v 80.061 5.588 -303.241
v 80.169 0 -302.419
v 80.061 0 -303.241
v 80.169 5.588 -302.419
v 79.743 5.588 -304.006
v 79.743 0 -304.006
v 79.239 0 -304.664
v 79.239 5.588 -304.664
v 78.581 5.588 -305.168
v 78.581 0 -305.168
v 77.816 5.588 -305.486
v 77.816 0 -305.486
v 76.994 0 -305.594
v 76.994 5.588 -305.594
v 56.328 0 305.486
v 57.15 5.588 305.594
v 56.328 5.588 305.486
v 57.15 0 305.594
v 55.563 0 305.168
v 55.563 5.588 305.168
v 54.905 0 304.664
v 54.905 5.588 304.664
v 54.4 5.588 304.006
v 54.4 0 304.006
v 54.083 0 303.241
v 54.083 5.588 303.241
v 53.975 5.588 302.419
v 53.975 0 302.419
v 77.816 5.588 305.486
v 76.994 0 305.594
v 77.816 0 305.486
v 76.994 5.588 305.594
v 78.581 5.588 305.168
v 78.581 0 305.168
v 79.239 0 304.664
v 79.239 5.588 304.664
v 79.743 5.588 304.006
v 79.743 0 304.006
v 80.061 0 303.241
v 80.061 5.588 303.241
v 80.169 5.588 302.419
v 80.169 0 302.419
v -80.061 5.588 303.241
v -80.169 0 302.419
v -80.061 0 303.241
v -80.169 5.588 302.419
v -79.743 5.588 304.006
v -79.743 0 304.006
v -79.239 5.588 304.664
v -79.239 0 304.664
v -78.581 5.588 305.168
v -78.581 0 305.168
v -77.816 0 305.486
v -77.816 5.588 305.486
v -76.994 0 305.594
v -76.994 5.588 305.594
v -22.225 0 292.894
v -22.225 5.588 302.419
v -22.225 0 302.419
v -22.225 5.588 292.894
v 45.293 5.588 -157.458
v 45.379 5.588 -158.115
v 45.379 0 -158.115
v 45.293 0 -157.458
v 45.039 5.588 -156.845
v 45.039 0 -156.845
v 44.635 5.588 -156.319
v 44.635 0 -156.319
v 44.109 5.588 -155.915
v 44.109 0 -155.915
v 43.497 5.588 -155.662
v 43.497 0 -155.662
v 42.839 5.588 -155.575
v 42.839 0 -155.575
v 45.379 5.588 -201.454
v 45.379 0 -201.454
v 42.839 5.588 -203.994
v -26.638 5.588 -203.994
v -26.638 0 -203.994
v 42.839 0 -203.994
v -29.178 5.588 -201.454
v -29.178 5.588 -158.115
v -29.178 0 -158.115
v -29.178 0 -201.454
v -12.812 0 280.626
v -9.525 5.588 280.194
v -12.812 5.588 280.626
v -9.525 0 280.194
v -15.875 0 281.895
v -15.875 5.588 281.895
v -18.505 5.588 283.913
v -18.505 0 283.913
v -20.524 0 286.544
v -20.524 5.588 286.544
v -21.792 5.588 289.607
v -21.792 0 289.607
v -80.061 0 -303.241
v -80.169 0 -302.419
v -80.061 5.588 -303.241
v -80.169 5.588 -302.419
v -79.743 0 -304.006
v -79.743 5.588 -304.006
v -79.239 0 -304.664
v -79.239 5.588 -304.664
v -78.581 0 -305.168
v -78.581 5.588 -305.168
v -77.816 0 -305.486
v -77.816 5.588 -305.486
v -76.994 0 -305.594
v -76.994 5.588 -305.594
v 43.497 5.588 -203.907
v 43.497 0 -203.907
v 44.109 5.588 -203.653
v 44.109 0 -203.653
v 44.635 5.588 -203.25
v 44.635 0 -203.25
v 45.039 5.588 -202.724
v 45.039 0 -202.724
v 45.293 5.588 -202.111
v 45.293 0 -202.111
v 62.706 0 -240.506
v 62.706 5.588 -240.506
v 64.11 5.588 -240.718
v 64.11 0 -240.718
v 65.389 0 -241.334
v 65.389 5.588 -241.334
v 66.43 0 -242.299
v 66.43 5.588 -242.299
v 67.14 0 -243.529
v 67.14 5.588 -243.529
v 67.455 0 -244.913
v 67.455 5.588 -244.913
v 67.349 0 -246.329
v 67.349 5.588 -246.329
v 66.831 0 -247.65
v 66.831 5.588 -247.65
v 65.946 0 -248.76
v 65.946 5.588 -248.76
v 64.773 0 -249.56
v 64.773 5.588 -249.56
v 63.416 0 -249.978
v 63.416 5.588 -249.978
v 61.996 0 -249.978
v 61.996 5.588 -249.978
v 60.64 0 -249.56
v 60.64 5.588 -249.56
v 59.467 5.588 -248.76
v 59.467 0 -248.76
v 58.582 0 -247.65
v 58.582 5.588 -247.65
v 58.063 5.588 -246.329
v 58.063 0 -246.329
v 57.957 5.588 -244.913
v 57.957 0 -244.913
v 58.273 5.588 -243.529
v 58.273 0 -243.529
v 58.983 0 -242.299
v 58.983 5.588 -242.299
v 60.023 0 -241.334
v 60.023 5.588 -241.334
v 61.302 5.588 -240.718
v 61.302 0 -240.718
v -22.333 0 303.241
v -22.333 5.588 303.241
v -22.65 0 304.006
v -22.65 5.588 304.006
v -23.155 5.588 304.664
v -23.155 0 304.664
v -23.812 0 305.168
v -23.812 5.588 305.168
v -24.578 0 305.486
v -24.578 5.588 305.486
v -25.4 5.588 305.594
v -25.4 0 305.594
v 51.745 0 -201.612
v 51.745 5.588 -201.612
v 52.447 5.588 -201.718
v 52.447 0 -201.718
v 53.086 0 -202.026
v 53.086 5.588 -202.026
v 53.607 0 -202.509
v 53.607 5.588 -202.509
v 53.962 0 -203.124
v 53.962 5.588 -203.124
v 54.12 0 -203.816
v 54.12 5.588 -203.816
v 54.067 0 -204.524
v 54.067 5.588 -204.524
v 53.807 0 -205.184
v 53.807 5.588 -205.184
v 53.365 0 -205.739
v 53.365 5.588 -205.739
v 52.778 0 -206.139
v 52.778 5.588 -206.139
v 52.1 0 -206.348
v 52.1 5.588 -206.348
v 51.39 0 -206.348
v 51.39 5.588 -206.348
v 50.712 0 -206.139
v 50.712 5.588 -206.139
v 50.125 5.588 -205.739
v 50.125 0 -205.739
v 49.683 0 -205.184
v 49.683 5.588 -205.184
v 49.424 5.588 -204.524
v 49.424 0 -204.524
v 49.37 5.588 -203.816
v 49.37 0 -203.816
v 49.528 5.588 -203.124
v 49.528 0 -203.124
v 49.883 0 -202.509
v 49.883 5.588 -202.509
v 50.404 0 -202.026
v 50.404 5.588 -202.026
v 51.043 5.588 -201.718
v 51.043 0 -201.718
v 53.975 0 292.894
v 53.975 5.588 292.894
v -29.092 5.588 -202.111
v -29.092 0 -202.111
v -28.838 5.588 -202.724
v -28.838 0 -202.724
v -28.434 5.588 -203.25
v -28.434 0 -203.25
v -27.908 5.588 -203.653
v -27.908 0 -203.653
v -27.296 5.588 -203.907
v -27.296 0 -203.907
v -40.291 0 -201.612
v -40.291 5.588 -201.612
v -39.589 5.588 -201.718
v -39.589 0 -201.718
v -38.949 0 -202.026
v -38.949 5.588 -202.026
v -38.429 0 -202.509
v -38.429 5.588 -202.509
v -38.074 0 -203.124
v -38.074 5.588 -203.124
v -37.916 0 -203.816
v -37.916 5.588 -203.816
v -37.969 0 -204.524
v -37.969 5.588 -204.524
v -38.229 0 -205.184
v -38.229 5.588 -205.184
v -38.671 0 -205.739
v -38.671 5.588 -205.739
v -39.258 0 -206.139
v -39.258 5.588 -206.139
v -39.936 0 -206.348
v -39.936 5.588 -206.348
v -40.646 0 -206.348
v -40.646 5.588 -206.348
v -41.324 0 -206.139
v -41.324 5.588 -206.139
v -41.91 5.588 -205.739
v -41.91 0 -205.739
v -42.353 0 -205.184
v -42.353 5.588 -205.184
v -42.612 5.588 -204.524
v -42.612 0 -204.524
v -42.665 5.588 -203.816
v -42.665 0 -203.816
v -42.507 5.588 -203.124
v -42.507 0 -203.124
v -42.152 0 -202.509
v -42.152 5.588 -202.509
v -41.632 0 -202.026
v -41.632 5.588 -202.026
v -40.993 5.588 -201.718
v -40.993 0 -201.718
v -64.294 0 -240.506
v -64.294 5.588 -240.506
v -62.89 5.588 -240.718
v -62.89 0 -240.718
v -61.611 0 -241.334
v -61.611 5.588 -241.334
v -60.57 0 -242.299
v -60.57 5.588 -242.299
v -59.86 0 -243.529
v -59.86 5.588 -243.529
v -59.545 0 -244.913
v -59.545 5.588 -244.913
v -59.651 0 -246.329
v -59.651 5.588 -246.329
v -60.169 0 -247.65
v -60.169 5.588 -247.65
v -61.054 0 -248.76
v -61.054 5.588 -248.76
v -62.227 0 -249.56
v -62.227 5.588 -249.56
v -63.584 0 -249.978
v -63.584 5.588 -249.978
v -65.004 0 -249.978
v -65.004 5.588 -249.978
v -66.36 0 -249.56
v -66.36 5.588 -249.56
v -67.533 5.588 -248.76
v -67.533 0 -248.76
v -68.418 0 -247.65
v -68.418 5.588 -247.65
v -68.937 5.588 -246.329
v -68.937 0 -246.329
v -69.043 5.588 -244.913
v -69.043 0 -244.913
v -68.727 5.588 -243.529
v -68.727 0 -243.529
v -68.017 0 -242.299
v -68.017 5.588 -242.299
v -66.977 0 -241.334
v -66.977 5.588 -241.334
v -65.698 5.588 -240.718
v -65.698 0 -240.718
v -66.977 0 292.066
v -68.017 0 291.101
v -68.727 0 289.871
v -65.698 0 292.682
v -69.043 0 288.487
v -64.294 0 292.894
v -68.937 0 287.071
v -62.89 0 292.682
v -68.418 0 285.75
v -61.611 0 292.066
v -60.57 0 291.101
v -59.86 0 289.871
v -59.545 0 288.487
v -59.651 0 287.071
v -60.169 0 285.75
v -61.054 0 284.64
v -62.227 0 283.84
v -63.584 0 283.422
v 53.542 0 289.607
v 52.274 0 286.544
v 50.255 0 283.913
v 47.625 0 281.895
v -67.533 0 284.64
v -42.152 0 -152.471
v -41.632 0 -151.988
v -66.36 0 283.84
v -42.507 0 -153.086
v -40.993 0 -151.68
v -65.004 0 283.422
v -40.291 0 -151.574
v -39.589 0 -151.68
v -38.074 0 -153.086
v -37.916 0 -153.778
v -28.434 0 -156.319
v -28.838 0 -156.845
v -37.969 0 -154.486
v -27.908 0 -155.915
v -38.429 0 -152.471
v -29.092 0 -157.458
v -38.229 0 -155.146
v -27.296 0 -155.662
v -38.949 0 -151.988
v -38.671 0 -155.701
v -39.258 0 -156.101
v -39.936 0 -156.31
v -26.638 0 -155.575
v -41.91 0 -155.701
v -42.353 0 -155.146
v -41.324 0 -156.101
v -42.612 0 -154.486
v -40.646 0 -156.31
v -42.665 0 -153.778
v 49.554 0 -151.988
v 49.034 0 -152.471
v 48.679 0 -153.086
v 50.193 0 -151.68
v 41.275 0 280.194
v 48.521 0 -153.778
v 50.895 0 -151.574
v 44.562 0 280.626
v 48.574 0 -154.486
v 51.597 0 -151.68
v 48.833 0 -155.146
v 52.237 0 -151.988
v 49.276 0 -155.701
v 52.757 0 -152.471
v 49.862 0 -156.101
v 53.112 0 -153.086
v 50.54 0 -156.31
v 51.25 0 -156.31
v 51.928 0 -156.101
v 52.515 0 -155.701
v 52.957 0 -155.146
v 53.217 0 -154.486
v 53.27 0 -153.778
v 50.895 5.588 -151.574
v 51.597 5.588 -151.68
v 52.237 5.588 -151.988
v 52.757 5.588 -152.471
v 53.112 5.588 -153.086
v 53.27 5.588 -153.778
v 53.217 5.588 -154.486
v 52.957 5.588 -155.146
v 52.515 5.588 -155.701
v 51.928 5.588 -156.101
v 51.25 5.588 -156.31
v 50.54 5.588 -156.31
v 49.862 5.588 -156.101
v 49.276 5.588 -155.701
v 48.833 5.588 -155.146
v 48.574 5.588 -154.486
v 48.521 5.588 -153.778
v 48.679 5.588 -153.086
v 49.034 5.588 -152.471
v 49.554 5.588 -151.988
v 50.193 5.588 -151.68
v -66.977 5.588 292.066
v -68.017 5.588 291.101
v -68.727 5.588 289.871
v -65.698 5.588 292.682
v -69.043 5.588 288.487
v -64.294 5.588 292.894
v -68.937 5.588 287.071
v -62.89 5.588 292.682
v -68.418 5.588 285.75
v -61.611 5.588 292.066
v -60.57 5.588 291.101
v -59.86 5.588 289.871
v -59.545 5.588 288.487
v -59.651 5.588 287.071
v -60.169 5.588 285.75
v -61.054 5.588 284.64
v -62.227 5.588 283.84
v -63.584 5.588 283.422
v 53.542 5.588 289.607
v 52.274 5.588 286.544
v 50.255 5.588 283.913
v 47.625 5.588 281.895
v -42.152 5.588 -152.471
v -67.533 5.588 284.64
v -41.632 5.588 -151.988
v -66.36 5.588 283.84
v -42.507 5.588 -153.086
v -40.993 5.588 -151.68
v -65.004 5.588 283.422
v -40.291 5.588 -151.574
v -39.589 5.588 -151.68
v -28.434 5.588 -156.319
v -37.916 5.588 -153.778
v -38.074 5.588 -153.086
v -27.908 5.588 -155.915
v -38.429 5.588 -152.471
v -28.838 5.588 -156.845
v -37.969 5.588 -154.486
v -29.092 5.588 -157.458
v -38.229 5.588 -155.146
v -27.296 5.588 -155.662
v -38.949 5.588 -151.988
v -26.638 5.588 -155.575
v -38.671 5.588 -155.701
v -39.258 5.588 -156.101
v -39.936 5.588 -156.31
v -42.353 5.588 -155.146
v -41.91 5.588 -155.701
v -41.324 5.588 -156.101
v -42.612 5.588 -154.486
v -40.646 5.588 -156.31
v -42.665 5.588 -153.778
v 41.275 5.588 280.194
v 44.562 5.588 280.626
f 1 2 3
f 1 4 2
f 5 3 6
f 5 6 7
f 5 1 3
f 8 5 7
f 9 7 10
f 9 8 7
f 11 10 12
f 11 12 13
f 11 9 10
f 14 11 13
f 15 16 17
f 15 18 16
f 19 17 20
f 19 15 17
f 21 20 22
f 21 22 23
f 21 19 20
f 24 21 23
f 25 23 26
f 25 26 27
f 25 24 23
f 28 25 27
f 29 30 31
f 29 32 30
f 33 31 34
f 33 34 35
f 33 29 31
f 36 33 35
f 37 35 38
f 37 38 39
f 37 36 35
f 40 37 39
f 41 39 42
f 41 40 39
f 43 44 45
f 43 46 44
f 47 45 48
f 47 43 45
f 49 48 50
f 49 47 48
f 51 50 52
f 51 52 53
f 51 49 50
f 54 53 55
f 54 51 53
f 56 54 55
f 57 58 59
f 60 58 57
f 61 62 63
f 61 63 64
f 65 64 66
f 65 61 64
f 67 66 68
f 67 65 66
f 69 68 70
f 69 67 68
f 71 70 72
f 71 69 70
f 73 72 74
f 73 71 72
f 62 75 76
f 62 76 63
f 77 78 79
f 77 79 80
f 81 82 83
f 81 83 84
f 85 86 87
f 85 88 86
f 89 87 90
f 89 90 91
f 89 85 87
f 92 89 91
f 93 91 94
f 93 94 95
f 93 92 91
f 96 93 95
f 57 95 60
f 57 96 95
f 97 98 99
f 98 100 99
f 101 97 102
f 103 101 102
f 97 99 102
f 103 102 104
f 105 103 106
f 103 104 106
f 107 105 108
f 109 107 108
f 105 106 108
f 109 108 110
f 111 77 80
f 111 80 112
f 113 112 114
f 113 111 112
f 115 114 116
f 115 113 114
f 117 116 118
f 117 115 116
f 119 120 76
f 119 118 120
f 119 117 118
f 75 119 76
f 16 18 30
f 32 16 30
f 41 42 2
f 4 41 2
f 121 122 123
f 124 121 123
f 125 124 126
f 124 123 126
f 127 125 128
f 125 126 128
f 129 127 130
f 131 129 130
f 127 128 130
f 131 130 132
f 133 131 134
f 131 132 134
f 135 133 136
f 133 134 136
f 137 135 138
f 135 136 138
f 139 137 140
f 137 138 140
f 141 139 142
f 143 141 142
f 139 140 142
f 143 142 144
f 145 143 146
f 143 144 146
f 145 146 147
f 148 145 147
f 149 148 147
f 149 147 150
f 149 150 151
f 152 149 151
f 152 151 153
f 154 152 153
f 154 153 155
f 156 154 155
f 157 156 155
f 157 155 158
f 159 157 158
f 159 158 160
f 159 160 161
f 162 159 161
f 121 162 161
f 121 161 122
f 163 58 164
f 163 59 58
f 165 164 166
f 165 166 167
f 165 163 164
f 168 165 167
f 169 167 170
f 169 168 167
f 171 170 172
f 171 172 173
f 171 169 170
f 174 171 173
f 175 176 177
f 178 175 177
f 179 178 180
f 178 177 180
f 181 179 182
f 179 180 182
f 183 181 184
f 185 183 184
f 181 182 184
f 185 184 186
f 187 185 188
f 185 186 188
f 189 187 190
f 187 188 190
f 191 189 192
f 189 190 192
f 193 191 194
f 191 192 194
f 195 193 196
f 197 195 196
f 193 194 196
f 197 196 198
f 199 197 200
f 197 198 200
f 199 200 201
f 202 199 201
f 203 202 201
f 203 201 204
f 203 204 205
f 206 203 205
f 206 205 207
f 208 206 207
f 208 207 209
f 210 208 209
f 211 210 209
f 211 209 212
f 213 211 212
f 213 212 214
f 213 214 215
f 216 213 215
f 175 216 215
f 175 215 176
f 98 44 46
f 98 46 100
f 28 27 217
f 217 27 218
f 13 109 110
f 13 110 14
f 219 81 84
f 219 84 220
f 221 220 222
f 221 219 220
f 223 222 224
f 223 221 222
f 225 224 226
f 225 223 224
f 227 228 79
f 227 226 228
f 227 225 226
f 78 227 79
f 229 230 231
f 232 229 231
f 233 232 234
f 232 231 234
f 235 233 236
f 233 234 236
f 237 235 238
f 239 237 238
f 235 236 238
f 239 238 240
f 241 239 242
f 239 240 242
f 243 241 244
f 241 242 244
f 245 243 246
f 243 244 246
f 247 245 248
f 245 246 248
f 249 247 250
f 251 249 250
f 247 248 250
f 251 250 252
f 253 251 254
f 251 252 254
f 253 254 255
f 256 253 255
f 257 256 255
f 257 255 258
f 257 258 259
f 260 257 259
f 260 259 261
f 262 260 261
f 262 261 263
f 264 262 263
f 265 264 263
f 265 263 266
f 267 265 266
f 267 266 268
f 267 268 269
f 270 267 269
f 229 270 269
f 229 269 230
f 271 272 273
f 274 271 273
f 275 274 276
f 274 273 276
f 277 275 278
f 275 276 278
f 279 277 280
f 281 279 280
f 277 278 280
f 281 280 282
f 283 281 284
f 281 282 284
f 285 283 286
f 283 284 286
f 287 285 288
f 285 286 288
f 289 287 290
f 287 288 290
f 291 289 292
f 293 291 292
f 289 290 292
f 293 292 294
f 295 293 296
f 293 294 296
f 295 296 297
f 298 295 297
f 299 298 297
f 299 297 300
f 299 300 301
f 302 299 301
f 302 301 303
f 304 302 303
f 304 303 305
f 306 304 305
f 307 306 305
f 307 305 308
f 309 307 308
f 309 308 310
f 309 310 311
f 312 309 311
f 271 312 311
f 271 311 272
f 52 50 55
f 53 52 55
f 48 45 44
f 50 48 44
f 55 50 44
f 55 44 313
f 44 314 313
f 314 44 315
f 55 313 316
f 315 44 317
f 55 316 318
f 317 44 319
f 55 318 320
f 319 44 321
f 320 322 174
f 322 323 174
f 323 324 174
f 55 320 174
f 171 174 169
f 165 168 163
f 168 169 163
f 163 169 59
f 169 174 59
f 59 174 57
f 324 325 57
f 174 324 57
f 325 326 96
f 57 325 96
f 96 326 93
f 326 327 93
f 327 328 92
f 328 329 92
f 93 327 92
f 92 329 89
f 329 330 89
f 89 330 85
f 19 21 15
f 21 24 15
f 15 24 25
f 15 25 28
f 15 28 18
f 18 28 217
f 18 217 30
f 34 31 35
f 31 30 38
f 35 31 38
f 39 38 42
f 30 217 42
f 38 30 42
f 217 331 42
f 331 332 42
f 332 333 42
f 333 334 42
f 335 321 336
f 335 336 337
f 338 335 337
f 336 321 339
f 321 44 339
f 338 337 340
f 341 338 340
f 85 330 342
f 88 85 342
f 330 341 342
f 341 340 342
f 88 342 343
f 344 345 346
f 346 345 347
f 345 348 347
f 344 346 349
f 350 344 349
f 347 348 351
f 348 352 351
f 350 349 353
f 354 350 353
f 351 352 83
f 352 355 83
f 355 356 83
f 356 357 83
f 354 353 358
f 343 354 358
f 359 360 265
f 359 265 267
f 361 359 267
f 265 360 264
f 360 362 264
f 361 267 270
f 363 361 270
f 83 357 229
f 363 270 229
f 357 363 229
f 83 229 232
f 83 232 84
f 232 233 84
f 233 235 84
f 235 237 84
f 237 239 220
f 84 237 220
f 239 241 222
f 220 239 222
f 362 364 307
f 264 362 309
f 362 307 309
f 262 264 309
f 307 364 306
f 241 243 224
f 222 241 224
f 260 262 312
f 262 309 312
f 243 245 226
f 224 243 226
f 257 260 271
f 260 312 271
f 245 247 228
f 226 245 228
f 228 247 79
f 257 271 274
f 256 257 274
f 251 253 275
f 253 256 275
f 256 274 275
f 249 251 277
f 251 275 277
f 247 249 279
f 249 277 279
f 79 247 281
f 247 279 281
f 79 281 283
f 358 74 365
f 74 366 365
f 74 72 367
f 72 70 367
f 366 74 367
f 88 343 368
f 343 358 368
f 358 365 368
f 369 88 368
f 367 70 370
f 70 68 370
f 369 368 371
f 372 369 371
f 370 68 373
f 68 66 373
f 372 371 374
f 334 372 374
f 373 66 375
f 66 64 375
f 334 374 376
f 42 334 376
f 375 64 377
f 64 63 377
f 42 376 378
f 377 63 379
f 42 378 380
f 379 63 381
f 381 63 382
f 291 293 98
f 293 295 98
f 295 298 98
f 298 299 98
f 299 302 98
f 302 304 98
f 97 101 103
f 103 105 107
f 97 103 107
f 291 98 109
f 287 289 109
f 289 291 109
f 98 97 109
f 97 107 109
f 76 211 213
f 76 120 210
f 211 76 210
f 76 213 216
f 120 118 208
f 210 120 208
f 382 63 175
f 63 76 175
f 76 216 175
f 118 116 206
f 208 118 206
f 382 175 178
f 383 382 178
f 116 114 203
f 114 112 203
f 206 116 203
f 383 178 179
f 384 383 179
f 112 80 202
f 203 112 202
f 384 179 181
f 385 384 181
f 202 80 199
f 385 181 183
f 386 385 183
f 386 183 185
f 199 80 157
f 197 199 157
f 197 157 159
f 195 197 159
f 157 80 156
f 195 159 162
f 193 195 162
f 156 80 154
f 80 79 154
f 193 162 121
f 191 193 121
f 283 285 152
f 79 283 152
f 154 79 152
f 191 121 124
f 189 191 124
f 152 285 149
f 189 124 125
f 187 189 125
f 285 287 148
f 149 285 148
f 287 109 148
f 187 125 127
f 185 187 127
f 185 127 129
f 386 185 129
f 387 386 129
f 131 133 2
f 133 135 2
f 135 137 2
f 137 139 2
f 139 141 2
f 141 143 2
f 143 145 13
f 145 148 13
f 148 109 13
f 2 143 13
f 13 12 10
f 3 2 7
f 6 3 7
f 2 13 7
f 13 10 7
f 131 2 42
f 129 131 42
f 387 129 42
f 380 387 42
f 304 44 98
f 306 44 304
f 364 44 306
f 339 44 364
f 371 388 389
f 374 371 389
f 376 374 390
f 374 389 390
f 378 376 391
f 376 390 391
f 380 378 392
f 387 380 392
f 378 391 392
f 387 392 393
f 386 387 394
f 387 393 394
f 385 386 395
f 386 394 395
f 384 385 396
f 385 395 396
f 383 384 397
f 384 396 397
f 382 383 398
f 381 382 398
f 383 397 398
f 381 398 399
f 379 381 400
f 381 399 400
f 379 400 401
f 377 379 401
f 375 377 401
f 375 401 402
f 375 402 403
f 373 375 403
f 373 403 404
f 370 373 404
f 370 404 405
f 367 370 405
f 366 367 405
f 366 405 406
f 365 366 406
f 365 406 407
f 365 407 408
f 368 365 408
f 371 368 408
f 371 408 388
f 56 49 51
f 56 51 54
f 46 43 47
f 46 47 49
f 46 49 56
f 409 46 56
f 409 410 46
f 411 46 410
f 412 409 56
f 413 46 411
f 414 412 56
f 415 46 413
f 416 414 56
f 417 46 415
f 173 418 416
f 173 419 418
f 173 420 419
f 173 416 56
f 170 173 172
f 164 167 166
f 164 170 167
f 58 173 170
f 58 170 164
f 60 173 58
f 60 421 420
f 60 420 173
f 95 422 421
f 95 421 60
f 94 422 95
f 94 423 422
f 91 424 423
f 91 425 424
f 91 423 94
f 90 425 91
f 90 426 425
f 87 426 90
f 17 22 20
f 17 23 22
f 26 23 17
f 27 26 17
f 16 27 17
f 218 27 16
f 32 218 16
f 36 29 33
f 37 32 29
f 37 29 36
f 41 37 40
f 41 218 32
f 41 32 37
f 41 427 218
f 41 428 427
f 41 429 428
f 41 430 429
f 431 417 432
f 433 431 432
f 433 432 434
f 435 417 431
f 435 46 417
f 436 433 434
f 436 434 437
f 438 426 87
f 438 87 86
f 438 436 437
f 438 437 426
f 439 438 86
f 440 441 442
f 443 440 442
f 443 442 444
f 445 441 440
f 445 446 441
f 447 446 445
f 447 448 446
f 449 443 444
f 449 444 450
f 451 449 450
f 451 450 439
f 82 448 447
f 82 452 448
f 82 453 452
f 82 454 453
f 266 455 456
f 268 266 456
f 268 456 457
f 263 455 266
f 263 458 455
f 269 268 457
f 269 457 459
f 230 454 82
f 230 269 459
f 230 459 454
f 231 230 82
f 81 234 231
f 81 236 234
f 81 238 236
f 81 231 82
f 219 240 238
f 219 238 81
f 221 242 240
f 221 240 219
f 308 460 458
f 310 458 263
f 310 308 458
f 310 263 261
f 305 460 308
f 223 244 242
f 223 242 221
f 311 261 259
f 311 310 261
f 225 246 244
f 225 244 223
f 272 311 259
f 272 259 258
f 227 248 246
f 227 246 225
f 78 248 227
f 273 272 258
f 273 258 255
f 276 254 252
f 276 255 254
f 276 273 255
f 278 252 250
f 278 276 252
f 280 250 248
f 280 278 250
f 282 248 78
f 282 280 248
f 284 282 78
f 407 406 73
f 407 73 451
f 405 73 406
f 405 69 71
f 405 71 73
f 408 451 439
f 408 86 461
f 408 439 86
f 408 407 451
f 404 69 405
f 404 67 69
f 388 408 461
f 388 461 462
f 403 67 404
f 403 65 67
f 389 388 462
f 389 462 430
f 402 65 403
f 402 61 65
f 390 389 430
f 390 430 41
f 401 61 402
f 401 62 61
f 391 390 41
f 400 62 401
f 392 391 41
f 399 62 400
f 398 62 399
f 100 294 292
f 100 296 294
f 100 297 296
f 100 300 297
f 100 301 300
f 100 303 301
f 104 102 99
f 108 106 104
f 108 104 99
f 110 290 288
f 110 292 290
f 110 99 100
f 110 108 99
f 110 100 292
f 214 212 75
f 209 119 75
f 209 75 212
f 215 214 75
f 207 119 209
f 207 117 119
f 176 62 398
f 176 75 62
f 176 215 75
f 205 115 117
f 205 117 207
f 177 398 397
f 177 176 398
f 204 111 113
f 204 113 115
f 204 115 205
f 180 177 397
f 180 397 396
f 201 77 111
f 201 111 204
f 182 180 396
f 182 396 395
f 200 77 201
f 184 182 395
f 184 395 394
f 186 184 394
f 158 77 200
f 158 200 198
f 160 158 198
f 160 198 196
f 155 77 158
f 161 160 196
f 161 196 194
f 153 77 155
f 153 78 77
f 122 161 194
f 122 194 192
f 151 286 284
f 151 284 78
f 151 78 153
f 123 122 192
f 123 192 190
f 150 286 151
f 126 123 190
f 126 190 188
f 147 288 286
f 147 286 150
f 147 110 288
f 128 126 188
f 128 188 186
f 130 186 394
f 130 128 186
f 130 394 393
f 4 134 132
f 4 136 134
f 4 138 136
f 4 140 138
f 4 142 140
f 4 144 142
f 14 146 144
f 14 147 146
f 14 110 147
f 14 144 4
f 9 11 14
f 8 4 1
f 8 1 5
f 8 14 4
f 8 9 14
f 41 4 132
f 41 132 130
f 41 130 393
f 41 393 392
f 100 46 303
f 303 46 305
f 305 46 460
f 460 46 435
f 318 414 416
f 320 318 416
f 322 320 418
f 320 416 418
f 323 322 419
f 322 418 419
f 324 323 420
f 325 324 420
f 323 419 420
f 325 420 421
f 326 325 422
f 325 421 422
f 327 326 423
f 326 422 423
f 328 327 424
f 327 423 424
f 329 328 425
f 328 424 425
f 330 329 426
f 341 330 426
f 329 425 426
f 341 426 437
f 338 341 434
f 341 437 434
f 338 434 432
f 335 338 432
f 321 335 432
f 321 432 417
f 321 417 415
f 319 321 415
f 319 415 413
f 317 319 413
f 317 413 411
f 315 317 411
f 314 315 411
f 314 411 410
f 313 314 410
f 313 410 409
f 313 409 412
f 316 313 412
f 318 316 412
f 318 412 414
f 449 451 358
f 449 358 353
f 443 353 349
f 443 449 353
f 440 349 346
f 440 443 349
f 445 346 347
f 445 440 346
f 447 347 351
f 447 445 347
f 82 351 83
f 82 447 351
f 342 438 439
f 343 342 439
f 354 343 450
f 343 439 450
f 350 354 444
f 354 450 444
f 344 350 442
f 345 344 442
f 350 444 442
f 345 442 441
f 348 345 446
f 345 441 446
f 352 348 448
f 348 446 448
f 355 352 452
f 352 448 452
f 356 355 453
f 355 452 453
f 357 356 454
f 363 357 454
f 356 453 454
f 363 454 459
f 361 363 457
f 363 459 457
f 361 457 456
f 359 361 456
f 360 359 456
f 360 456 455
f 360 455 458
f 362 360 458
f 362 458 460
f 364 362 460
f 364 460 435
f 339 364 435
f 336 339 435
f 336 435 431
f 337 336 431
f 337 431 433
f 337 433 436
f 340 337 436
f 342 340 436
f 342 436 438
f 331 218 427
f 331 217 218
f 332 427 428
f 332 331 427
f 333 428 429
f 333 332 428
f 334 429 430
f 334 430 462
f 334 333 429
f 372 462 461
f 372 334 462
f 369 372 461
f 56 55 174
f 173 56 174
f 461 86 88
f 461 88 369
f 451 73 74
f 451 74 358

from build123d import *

# Parameters (mm, degrees)
SKETCH1_W           = 160.3375
SKETCH1_H           = 611.1875
BOSS_EXTRUDE1_DEPTH = 5.588
FILLET1_R           = 3.175
SKETCH2_R           = 4.7625
CUT_EXTRUDE1_DEPTH  = 6.35
SKETCH3_W           = 76.2
SKETCH3_H           = 25.4
CUT_EXTRUDE2_DEPTH  = 6.35
FILLET2_R           = 3.175
FILLET3_R           = 12.7
SKETCH4_R           = 2.38125
CUT_EXTRUDE3_DEPTH  = 25.4


with BuildPart() as part:
    # Sketch1 → Boss-Extrude1 (new body)
    with BuildSketch(Plane(origin=(0, 0, 0), x_dir=(1, 0, 0), z_dir=(0, 1, 0))):
        Rectangle(SKETCH1_W, SKETCH1_H)
    extrude(amount=BOSS_EXTRUDE1_DEPTH)

    # Fillet1
    fillet1_edges = [part.edges().sort_by_distance(p)[0] for p in [
        (80.16875, 2.794, 305.59375),
        (-80.16875, 2.794, 305.59375),
        (-80.16875, 2.794, -305.59375),
        (80.16875, 2.794, -305.59375),
    ]]
    fillet(fillet1_edges, radius=FILLET1_R)

    # Sketch2 → Cut-Extrude1 (cut)
    with BuildSketch(Plane(origin=(0, 5.588, 0), x_dir=(1, 0, 0), z_dir=(0, 1, 0))):
        with Locations(Location((62.70625, 245.26875, 0), (0, 0, 270))):
            Circle(SKETCH2_R)
        with Locations(Location((-64.29375, 245.26875, 0), (0, 0, 270))):
            Circle(SKETCH2_R)
        with Locations(Location((-64.29375, -288.13125, 0), (0, 0, 270))):
            Circle(SKETCH2_R)
    extrude(amount=-CUT_EXTRUDE1_DEPTH, mode=Mode.SUBTRACT)

    # Sketch3 → Cut-Extrude2 (cut)
    with BuildSketch(Plane(origin=(0, 5.588, 0), x_dir=(1, 0, 0), z_dir=(0, 1, 0))):
        with Locations((15.875, -292.89375)):
            Rectangle(SKETCH3_W, SKETCH3_H)
    extrude(amount=-CUT_EXTRUDE2_DEPTH, mode=Mode.SUBTRACT)

    # Fillet2
    fillet2_edges = [part.edges().sort_by_distance(p)[0] for p in [
        (-22.225, 2.794, 305.59375),
        (53.975, 2.794, 305.59375),
    ]]
    fillet(fillet2_edges, radius=FILLET2_R)

    # Fillet3
    fillet3_edges = [part.edges().sort_by_distance(p)[0] for p in [
        (-22.225, 2.794, 280.19375),
        (53.975, 2.794, 280.19375),
    ]]
    fillet(fillet3_edges, radius=FILLET3_R)

    # Sketch4 → Cut-Extrude3 (cut)
    with BuildSketch(Plane(origin=(0, 5.588, 0), x_dir=(1, 0, 0), z_dir=(0, 1, 0))):
        with Locations(Location((-40.29075, 203.99375, 0), (0, 0, 270))):
            Circle(SKETCH4_R)
        with Locations(Location((-40.29075, 153.95575, 0), (0, 0, 270))):
            Circle(SKETCH4_R)
        with Locations(Location((51.745051389, 203.99375, 0), (0, 0, 270))):
            Circle(SKETCH4_R)
        with Locations(Location((50.89525, 153.95575, 0), (0, 0, 270))):
            Circle(SKETCH4_R)
        with BuildLine():
            Line((-26.63825, 203.99375), (42.839342829, 203.99375))
            ThreePointArc((42.839342829, 203.99375), (44.635394053, 203.249801224), (45.379342829, 201.45375))
            Line((45.379342829, 201.45375), (45.379342829, 158.115))
            ThreePointArc((45.379342829, 158.115), (44.635394053, 156.318948776), (42.839342829, 155.575))
            Line((42.839342829, 155.575), (-26.63825, 155.575))
            ThreePointArc((-26.63825, 155.575), (-28.434301224, 156.318948776), (-29.17825, 158.115))
            Line((-29.17825, 158.115), (-29.17825, 201.45375))
            ThreePointArc((-29.17825, 201.45375), (-28.434301224, 203.249801224), (-26.63825, 203.99375))
        make_face()
    extrude(amount=-CUT_EXTRUDE3_DEPTH, mode=Mode.SUBTRACT)


solid = part.part
